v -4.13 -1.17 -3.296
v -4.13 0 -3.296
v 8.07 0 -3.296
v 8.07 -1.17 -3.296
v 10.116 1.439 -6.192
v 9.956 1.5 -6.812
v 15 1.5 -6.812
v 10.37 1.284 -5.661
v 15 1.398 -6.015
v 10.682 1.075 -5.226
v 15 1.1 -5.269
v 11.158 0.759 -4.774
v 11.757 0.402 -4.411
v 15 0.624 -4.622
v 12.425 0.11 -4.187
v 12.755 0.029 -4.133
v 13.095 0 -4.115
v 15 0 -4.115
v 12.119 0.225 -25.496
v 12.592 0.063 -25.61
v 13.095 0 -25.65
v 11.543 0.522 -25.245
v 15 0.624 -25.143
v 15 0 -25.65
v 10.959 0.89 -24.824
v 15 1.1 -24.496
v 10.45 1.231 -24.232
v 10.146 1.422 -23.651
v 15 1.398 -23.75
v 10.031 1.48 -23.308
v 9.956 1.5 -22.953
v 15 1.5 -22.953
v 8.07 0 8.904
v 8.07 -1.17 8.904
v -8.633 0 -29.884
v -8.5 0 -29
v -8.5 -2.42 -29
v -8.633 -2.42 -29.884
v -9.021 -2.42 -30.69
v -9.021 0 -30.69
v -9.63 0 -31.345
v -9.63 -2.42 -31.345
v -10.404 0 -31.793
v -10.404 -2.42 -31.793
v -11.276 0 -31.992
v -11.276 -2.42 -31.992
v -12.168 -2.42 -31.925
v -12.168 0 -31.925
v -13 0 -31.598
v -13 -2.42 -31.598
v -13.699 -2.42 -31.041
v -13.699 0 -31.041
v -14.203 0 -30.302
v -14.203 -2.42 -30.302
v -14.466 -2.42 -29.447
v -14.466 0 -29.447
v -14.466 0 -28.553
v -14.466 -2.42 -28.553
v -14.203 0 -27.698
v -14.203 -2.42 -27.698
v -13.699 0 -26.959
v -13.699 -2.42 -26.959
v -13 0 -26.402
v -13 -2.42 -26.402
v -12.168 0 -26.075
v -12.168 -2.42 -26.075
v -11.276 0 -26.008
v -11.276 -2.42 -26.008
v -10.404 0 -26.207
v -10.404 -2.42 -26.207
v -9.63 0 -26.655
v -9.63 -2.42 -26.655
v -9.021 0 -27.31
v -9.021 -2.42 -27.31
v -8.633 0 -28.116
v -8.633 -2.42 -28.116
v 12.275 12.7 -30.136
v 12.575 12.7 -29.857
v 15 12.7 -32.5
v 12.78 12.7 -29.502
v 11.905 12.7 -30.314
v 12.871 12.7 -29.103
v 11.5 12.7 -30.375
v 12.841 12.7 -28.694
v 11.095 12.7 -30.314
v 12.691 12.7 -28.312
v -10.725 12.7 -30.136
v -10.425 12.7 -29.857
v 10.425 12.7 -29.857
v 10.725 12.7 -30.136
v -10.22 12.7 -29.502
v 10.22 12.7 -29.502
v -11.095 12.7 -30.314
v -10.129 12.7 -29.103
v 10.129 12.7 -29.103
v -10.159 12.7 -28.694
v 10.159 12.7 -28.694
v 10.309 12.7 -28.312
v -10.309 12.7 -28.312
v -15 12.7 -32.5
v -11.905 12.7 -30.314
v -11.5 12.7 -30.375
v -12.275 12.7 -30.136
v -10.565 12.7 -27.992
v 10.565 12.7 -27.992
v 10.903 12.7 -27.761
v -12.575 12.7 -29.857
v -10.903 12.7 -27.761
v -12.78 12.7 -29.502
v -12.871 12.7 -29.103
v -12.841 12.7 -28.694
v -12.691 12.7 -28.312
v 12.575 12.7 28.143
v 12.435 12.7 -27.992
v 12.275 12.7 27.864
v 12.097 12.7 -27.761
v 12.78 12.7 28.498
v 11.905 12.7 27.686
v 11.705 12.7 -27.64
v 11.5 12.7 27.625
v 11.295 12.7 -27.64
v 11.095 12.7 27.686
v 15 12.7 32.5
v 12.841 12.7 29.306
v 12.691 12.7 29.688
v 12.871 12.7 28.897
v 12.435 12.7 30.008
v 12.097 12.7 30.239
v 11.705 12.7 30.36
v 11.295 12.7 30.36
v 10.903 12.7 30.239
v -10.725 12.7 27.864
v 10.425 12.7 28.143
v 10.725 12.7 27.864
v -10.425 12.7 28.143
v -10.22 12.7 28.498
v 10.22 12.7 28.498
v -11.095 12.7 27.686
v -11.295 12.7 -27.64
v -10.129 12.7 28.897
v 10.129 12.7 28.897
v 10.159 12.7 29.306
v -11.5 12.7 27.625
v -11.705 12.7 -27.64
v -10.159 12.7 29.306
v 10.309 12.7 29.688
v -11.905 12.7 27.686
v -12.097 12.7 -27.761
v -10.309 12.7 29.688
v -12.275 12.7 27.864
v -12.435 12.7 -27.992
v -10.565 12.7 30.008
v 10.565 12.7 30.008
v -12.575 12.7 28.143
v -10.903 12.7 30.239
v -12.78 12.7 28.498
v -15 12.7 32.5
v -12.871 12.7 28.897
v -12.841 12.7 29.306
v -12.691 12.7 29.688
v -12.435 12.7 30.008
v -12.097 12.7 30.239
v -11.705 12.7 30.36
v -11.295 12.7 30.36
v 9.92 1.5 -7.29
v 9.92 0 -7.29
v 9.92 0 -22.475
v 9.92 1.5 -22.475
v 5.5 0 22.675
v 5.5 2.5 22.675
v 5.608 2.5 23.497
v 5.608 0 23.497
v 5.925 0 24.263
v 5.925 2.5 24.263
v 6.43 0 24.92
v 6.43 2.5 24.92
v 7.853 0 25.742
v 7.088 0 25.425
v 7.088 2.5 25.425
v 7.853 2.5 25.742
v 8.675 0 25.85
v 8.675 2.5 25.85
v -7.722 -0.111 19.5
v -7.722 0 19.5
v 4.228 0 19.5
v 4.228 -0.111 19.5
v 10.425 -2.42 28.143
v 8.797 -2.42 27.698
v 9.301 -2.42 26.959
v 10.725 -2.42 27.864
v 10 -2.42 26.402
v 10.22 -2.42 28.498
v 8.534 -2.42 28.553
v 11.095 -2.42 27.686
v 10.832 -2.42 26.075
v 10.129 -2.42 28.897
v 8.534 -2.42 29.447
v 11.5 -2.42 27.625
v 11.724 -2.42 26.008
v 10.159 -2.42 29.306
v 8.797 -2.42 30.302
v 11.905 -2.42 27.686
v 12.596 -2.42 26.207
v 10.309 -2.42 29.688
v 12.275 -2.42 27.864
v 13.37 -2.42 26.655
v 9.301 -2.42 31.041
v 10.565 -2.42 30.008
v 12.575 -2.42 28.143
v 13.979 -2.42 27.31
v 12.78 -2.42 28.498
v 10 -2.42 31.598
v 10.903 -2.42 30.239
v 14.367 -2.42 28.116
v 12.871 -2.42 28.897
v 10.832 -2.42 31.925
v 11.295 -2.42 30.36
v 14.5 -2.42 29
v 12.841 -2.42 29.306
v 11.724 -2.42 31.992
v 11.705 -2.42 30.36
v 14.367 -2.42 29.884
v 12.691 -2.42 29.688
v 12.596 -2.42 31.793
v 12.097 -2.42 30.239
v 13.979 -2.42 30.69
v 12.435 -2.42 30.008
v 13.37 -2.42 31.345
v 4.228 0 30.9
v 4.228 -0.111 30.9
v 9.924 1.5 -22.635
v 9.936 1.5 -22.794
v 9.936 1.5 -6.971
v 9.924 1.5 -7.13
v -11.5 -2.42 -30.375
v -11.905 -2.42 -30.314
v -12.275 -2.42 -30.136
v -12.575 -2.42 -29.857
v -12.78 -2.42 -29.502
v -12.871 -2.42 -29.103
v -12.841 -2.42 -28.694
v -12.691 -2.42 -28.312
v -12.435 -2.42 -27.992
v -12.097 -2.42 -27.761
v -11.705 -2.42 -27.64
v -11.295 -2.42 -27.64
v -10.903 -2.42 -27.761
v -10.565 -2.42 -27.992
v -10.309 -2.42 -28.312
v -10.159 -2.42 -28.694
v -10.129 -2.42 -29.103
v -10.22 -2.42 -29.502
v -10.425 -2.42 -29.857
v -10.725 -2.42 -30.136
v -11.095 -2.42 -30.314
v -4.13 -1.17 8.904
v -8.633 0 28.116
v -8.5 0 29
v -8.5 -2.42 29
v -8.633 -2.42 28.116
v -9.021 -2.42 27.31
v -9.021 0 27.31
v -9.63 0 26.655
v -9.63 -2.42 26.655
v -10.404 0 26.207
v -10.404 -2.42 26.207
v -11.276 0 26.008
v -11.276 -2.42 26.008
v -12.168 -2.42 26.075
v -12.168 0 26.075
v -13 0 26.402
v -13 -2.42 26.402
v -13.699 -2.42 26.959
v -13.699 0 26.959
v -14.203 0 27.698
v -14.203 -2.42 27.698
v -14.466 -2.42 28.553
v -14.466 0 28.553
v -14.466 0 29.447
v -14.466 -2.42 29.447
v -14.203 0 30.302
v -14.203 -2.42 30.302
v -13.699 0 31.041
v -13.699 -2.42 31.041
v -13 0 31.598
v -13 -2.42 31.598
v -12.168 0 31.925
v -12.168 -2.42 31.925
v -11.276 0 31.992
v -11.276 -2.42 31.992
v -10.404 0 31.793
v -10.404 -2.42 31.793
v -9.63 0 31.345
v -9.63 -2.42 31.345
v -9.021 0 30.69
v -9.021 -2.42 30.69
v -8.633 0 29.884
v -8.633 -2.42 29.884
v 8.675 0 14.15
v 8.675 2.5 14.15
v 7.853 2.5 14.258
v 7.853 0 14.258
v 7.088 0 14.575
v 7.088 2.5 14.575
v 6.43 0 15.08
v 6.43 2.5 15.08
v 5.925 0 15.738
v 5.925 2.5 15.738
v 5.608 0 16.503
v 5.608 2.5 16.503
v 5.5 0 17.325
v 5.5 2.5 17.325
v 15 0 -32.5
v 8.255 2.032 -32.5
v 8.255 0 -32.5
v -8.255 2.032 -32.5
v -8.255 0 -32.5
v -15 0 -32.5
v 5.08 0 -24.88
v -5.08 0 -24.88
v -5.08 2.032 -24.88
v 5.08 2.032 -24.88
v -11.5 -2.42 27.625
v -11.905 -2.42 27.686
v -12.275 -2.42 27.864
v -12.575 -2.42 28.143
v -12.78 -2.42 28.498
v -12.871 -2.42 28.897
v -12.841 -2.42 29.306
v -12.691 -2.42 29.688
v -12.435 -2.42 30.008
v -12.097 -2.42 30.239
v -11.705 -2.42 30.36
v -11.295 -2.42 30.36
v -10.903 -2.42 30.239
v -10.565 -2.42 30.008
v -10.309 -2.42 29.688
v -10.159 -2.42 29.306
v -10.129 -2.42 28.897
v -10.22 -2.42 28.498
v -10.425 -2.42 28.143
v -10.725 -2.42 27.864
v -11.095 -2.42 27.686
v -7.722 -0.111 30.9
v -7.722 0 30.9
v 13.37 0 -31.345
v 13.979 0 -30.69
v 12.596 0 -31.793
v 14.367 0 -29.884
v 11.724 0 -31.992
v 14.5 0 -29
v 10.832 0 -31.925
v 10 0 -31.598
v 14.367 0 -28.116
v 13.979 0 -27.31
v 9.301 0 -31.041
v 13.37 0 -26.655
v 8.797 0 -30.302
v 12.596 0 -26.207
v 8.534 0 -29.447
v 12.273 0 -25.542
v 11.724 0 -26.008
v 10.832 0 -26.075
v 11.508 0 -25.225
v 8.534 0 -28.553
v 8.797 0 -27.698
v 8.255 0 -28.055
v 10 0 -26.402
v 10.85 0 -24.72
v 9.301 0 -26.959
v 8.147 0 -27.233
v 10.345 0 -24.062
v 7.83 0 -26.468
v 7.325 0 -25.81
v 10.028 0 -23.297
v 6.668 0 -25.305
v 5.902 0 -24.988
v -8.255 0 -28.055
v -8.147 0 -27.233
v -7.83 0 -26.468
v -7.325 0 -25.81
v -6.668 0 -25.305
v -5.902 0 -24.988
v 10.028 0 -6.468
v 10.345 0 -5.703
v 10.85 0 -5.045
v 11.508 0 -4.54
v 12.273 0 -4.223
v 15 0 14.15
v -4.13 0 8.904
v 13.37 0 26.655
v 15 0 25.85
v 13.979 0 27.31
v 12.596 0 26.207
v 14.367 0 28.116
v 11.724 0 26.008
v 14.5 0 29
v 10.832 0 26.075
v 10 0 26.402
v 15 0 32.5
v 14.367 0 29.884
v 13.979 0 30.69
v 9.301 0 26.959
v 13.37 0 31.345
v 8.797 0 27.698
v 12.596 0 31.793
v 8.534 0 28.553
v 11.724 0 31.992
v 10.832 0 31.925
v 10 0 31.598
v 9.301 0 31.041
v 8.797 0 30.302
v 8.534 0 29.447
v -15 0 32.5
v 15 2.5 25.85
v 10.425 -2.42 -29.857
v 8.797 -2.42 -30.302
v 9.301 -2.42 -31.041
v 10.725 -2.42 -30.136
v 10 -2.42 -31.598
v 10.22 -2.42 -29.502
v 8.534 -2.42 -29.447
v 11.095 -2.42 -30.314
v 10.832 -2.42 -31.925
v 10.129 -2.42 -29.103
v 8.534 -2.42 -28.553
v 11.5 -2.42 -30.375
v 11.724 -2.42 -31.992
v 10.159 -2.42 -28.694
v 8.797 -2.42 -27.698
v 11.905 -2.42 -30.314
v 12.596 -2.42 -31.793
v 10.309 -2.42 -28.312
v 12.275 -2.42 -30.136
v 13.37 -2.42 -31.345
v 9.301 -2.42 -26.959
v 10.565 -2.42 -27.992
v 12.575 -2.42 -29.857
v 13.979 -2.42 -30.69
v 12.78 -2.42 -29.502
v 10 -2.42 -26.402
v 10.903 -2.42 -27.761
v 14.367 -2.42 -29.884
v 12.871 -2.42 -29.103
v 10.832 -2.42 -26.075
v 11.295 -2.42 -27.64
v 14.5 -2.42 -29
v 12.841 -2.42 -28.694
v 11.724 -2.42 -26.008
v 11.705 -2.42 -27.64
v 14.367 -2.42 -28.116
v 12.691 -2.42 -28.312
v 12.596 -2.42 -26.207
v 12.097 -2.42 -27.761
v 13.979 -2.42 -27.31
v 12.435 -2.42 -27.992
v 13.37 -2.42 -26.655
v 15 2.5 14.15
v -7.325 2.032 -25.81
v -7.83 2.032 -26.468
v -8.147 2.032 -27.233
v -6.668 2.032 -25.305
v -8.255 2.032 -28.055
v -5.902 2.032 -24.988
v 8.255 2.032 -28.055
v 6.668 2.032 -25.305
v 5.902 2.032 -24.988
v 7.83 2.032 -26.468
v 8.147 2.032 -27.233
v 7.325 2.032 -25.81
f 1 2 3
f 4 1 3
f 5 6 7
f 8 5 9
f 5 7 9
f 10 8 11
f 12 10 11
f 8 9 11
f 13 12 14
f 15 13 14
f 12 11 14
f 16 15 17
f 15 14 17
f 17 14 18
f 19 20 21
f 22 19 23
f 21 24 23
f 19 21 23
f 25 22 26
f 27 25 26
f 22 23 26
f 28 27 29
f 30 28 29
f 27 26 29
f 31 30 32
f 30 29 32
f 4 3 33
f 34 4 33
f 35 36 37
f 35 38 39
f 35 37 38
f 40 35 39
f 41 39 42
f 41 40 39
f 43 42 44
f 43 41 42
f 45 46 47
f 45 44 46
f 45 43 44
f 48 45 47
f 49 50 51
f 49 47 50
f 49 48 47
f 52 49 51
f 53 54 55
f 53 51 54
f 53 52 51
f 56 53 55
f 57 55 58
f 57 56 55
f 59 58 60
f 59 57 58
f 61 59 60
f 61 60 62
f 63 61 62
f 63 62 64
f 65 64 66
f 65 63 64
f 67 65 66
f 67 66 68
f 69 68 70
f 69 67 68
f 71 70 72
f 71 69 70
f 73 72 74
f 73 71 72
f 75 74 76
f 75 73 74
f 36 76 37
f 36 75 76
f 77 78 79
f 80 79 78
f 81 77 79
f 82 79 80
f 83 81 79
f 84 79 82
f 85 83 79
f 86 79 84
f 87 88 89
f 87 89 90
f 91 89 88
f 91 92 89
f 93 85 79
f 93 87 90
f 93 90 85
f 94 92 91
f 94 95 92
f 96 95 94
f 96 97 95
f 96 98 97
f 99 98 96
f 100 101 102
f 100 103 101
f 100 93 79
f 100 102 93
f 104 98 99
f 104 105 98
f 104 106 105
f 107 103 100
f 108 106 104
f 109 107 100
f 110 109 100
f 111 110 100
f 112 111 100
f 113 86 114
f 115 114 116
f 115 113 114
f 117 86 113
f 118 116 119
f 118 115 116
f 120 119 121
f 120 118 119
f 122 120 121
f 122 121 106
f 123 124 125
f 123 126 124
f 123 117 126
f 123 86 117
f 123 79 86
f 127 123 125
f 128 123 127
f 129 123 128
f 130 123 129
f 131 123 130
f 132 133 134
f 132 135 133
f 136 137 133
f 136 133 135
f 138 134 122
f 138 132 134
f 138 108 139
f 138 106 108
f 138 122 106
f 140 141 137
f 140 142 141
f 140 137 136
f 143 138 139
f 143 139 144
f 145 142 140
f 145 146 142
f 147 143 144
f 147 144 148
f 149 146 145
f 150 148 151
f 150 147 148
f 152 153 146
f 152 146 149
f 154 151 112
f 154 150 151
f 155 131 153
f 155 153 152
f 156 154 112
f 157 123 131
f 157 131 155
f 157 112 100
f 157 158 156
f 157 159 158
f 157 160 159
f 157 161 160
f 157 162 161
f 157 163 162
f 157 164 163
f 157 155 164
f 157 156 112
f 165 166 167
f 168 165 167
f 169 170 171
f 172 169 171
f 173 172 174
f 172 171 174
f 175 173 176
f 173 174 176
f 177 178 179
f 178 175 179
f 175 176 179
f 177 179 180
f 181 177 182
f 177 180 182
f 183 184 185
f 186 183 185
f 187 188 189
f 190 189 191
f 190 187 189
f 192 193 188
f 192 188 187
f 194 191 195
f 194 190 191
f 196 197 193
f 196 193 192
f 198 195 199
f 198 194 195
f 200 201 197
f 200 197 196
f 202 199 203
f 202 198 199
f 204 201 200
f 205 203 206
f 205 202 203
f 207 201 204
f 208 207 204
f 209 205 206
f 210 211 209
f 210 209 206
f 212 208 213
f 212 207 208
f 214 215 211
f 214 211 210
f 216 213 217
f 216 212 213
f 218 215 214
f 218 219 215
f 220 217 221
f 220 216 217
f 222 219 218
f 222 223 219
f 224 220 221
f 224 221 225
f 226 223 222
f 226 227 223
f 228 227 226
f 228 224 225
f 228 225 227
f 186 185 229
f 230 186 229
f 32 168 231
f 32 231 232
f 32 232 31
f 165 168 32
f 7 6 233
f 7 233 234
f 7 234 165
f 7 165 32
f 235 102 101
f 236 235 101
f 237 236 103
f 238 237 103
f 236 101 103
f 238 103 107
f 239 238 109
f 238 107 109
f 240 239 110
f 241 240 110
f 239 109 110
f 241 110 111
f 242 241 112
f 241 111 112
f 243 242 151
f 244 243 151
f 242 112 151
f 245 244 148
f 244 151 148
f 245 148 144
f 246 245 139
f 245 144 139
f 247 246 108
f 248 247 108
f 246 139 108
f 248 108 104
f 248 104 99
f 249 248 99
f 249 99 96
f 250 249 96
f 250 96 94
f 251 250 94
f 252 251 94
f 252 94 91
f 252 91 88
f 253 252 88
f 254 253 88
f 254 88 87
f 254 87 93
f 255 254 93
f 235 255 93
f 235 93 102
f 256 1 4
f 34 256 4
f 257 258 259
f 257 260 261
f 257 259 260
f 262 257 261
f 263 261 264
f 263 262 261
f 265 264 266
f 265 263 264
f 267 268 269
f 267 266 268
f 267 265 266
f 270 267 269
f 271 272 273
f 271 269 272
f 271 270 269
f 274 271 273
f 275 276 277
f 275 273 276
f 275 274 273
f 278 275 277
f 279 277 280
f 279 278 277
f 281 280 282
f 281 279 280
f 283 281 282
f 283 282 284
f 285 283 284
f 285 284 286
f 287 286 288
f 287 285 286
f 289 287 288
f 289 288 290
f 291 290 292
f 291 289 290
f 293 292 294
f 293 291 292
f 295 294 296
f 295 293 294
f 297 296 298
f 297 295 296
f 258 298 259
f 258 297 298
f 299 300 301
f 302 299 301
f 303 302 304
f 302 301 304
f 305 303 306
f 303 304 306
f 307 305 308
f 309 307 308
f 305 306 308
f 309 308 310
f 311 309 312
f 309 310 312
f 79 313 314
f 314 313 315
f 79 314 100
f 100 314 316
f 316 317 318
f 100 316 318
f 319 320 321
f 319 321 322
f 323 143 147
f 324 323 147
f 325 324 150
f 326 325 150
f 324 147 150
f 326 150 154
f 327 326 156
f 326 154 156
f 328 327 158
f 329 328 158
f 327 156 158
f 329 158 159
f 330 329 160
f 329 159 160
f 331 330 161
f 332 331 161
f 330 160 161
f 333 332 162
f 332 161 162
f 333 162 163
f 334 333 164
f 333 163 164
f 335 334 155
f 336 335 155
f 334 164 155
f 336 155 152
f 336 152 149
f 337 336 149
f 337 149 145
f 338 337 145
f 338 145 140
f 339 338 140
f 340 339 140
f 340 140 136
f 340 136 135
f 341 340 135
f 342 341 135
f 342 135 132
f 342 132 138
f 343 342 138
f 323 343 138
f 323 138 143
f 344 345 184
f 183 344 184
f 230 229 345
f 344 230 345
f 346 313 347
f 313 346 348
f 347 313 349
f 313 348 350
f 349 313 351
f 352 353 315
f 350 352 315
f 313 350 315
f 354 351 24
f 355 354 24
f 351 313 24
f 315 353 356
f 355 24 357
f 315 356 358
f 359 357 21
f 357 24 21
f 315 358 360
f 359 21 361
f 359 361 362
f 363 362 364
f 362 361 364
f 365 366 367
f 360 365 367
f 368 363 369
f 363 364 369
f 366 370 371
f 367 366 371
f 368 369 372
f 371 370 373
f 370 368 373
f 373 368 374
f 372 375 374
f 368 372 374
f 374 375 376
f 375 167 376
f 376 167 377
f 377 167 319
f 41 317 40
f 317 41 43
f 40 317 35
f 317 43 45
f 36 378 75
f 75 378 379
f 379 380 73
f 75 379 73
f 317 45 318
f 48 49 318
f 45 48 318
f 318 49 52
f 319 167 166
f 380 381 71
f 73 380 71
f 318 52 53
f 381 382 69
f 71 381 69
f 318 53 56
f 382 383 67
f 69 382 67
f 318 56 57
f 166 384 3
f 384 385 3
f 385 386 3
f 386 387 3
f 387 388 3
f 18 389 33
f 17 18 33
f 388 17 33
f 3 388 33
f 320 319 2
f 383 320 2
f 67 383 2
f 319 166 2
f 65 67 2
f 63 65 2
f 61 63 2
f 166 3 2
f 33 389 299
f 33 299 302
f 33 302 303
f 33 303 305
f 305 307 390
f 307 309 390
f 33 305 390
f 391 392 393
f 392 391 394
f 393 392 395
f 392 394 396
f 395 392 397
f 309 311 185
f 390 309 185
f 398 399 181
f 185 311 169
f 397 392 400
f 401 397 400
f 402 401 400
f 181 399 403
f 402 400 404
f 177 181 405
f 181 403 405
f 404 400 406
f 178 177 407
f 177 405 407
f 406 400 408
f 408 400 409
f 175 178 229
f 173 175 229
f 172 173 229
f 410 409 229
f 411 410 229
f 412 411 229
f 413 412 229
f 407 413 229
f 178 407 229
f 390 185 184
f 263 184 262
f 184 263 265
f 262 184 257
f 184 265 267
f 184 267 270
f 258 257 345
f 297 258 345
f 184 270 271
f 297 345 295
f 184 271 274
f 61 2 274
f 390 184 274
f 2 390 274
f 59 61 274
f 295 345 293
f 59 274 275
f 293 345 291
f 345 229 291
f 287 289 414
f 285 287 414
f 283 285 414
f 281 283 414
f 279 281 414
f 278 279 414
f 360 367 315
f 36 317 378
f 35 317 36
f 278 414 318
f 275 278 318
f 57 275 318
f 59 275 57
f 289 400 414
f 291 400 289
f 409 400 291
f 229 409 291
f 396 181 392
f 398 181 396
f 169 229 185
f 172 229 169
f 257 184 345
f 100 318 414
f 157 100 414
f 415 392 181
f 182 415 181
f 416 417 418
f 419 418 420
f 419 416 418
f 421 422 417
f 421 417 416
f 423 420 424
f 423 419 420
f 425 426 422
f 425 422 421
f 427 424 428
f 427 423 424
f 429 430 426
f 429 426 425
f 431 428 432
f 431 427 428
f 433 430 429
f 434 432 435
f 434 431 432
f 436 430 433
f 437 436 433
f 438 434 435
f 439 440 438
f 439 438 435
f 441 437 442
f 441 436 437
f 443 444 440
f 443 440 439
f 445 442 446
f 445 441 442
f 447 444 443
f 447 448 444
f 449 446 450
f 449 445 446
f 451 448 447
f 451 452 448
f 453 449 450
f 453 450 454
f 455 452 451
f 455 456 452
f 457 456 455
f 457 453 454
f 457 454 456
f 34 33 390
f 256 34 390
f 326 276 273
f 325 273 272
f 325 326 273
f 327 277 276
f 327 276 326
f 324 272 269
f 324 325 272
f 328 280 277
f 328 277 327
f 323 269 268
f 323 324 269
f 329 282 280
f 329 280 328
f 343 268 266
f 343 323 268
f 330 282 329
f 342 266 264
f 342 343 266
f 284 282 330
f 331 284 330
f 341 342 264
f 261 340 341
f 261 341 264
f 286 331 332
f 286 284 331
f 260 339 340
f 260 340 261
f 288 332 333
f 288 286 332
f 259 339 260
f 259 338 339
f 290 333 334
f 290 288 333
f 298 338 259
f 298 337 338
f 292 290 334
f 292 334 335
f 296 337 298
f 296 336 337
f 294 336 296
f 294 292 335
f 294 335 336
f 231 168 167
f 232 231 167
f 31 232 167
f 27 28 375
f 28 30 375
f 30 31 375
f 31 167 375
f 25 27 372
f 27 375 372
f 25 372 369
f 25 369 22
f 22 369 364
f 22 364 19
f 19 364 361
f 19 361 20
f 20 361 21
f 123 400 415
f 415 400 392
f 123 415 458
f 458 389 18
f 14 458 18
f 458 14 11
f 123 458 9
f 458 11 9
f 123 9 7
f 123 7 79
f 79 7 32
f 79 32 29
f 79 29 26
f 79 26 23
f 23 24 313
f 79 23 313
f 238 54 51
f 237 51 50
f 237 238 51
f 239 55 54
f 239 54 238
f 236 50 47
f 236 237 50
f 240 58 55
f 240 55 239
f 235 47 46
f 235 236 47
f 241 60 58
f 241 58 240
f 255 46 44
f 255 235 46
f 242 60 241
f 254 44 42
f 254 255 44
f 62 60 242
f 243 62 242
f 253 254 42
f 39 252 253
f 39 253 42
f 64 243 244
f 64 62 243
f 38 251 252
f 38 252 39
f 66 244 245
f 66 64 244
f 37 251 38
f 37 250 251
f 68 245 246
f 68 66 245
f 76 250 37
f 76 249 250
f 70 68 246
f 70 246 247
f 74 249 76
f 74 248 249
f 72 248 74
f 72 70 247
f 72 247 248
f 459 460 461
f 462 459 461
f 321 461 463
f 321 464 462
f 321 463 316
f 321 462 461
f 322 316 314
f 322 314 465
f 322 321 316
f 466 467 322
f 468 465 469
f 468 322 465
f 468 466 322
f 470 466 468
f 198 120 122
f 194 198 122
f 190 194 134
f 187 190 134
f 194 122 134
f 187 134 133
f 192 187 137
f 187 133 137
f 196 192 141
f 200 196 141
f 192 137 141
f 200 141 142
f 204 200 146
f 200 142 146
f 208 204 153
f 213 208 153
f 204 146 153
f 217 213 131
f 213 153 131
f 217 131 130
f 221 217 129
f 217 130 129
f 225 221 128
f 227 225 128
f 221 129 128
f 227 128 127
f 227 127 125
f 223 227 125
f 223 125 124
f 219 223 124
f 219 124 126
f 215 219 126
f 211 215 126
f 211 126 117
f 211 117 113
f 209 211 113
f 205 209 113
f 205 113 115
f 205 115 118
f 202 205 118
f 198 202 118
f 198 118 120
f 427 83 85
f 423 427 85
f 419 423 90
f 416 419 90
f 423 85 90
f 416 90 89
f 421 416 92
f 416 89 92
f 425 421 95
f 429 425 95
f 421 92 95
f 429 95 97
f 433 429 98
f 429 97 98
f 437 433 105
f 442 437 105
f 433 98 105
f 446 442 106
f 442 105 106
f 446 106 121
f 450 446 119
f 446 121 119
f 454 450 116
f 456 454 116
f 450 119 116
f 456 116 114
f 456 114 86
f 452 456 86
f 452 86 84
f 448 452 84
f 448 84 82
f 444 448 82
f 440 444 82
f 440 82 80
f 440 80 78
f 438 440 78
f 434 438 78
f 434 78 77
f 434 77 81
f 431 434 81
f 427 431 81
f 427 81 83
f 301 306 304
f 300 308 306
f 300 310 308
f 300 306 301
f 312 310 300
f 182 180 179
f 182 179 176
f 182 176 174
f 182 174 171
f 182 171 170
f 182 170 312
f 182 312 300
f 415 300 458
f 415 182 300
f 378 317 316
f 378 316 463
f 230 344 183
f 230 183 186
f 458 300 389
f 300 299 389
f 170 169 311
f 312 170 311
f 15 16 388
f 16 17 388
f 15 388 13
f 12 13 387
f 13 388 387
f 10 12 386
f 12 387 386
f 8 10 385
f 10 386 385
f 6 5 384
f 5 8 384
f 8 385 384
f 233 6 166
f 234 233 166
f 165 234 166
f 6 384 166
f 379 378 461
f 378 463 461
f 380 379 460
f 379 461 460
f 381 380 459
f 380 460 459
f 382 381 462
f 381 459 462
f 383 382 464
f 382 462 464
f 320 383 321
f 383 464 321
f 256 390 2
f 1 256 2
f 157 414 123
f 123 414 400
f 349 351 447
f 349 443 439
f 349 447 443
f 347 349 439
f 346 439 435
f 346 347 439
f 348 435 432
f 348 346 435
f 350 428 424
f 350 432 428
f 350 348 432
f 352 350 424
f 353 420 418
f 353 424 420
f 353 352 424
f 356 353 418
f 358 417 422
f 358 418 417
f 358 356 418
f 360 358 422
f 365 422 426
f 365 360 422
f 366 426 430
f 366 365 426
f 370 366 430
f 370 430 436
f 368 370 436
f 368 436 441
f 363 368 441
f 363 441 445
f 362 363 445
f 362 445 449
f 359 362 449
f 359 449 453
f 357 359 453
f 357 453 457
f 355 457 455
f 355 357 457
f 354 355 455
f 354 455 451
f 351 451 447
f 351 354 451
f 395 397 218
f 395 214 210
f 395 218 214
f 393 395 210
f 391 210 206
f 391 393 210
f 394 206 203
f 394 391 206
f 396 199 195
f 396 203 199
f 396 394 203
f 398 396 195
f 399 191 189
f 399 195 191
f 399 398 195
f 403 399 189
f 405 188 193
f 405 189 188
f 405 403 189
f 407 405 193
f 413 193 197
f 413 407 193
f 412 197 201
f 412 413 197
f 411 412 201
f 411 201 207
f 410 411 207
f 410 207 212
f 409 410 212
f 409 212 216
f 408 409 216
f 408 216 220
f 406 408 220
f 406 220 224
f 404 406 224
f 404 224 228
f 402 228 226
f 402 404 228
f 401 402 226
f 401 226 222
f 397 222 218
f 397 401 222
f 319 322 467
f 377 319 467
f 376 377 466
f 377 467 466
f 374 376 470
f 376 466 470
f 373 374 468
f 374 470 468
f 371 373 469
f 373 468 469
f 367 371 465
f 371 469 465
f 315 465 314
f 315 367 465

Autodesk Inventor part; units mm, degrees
ref_plane "YZ Plane" through (0, 0, 0) normal (1, 0, 0) x (0, 1, 0)
ref_plane "XZ Plane" through (0, 0, 0) normal (0, 1, 0) x (-1, 0, 0)
ref_plane "XY Plane" through (0, 0, 0) normal (0, 0, 1) x (1, 0, 0)
sketch "Sketch1" plane through (0, 0, 0) normal (0, 1, 0) x (-1, 0, 0)
  line L0 (15, 32.5) -> (-15, 32.5)
  line L1 (-15, 32.5) -> (-15, -32.5)
  line L2 (-15, -32.5) -> (15, -32.5)
  line L3 (15, -32.5) -> (15, 32.5)
  point P0 (0, 0)
  dimension "d0" = 65
  dimension "d1" = 30
  dimension "d2" = 15
  dimension "d3" = 32.5
extrude "Extrusion1" add sketch "Sketch1" along normal blind 12.7
sketch "Sketch2" plane through (0, 0, 0) normal (0, -1, 0) x (1, 0, 0)
  line L0 (8.07, 8.904) -> (-4.13, 8.904)
  line L1 (-4.13, 8.904) -> (-4.13, -3.296)
  line L2 (-4.13, -3.296) -> (8.07, -3.296)
  line L3 (8.07, -3.296) -> (8.07, 8.904)
  line L4 (-15, 32.5) -> (15, 32.5) projected
  line L5 (15, 32.5) -> (15, -32.5) projected
  point P0 (0, 0)
  dimension "d6" = 12.2
  dimension "d7" = 12.2
  dimension "d8" = 23.596
  dimension "d9" = 6.93
extrude "Extrusion2" add sketch "Sketch2" along normal blind 1.17
sketch "Sketch3" plane through (0, 0, 0) normal (0, -1, 0) x (1, 0, 0)
  line L0 (15, 32.5) -> (15, -32.5) projected
  line L1 (15, 25.85) -> (5.5, 25.85)
  line L2 (5.5, 25.85) -> (5.5, 14.15)
  line L3 (5.5, 14.15) -> (15, 14.15)
  line L4 (15, 14.15) -> (15, 25.85)
  line L5 (-15, 32.5) -> (15, 32.5) projected
  point P0 (0, 0)
  dimension "d12" = 9.5
  dimension "d13" = 11.7
  dimension "d14" = 6.65
extrude "Extrusion3" cut sketch "Sketch3" against normal blind 2.5
sketch "Sketch4" plane through (0, 0, 0) normal (0, -1, 0) x (1, 0, 0)
  line L0 (15, 14.15) -> (15, -32.5) projected
  line L1 (15, -4.75) -> (10.3, -4.75)
  line L2 (10.3, -4.75) -> (10.3, -13.05)
  line L3 (10.3, -13.05) -> (15, -13.05)
  line L4 (15, -13.05) -> (15, -4.75)
  line L5 (-15, 32.5) -> (15, 32.5) projected
  point P0 (0, 0)
  dimension "d17" = 4.7
  dimension "d18" = 8.3
  dimension "d19" = 37.25
extrude "Extrusion4" cut sketch "Sketch4" against normal blind 1
sketch "Sketch5" plane through (0, 0, 0) normal (0, -1, 0) x (1, 0, 0)
  line L0 (15, -13.05) -> (15, -32.5) projected
  line L1 (10.3, -25.65) -> (15, -25.65)
  line L2 (15, -32.5) -> (-15, -32.5) projected
  line L3 (10.3, -4.75) -> (15, -4.75) projected
  line L4 (15, -25.65) -> (15, -4.115)
  line L5 (15, -4.115) -> (9.92, -4.115)
  line L6 (9.92, -4.115) -> (9.92, -25.65)
  line L7 (10.3, -25.65) -> (9.92, -25.65)
  point P0 (0, 0)
  point P1 (15, -7.29)
  dimension "d22" = 4.7
  dimension "d24" = 6.85
  dimension "d69" = 5.08
  dimension "d70" = 0.635
extrude "Extrusion5" cut sketch "Sketch5" against normal blind 1.5
sketch "Sketch6" plane through (0, 0, 0) normal (0, -1, 0) x (1, 0, 0)
  circle A0 centre (11.5, 29) radius 3
  circle A1 centre (-11.5, 29) radius 3
  circle A2 centre (-11.5, -29) radius 3
  circle A3 centre (11.5, -29) radius 3
  line L0 (15, -32.5) -> (-15, -32.5) projected
  line L1 (-15, -32.5) -> (-15, 32.5) projected
  line L2 (-15, 32.5) -> (15, 32.5) projected
  point P0 (0, 0)
  dimension "d27" = 6
  dimension "d28" = 6
  dimension "d29" = 6
  dimension "d30" = 6
  dimension "d31" = 0
  dimension "d32" = 23
  dimension "d33" = 58
  dimension "d34" = 3.5
  dimension "d35" = 23
  dimension "d37" = 0
  dimension "d38" = 3.5
  dimension "d42" = 3.5
extrude "Extrusion6" add sketch "Sketch6" along normal blind 2.42
sketch "Sketch7" plane through (11.5, -2.42, 29) normal (0, -1, 0) x (1, 0, 0)
  circle A0 centre (0, 0) radius 3 projected
  circle A1 centre (0, -58) radius 3 projected
  circle A2 centre (-23, -58) radius 3 projected
  circle A3 centre (-23, 0) radius 3 projected
  point P0 (-11.5, -29)
hole "Hole1" at (11.5, -2.42, 29) at (-11.5, -2.42, 29) at (-11.5, -2.42, -29) at (11.5, -2.42, -29) direction (0, 1, 0) diameter 2.75 depth 25.4 tip angle 118
sketch "Sketch8" plane through (0, 0, 0) normal (0, -1, 0) x (1, 0, 0)
  line L0 (15, -32.5) -> (-15, -32.5) projected
  line L1 (8.255, -32.5) -> (-8.255, -32.5)
  line L2 (-8.255, -32.5) -> (-8.255, -24.88)
  line L3 (-8.255, -24.88) -> (8.255, -24.88)
  line L4 (8.255, -24.88) -> (8.255, -32.5)
  point P0 (0, 0)
  point P1 (0, 0)
  dimension "d50" = 7.62
  dimension "d51" = 16.51
  dimension "d52" = 8.255
extrude "Extrusion7" cut sketch "Sketch8" against normal blind 2.032
sketch "Sketch9" plane through (0, 0, 0) normal (0, -1, 0) x (1, 0, 0)
  line L0 (4.228, 30.9) -> (-7.722, 30.9)
  line L1 (-7.722, 30.9) -> (-7.722, 19.5)
  line L2 (-7.722, 19.5) -> (4.228, 19.5)
  line L3 (4.228, 19.5) -> (4.228, 30.9)
  line L4 (-15, 32.5) -> (15, 32.5) projected
  line L5 (-15, -32.5) -> (-15, 32.5) projected
  line L6 (15, 32.5) -> (15, 25.85) projected
  point P0 (0, 0)
  dimension "d56" = 1.6
  dimension "d57" = 11.4
  dimension "d58" = 11.95
  dimension "d60" = 10.772
extrude "Extrusion9" add sketch "Sketch9" along normal blind 0.1111
fillet "Fillet3" radius 3.175 4 edges at (9.92, 0.75, -25.65) (9.92, 0.75, -4.115) (12.46, 1.5, -4.115) (12.46, 1.5, -25.65)
fillet "Fillet4" radius 3.175 2 edges at (-8.255, 1.016, -24.88) (8.255, 1.016, -24.88)
fillet "Fillet5" radius 3.175 2 edges at (5.5, 1.25, 25.85) (5.5, 1.25, 14.15)
equation "\"d2\" = 0.5 * d1"
equation "\"d3\" = 0.5 * d0"
equation "\"d6\" = d7"
equation "\"d28\" = d27"
equation "\"d29\" = d27"
equation "\"d30\" = d27"
equation "\"d35\" = d32"
equation "\"d52\" = 0.5 * d51"
properties part number "Heat Block for Pi" material "Aluminum 6061"
